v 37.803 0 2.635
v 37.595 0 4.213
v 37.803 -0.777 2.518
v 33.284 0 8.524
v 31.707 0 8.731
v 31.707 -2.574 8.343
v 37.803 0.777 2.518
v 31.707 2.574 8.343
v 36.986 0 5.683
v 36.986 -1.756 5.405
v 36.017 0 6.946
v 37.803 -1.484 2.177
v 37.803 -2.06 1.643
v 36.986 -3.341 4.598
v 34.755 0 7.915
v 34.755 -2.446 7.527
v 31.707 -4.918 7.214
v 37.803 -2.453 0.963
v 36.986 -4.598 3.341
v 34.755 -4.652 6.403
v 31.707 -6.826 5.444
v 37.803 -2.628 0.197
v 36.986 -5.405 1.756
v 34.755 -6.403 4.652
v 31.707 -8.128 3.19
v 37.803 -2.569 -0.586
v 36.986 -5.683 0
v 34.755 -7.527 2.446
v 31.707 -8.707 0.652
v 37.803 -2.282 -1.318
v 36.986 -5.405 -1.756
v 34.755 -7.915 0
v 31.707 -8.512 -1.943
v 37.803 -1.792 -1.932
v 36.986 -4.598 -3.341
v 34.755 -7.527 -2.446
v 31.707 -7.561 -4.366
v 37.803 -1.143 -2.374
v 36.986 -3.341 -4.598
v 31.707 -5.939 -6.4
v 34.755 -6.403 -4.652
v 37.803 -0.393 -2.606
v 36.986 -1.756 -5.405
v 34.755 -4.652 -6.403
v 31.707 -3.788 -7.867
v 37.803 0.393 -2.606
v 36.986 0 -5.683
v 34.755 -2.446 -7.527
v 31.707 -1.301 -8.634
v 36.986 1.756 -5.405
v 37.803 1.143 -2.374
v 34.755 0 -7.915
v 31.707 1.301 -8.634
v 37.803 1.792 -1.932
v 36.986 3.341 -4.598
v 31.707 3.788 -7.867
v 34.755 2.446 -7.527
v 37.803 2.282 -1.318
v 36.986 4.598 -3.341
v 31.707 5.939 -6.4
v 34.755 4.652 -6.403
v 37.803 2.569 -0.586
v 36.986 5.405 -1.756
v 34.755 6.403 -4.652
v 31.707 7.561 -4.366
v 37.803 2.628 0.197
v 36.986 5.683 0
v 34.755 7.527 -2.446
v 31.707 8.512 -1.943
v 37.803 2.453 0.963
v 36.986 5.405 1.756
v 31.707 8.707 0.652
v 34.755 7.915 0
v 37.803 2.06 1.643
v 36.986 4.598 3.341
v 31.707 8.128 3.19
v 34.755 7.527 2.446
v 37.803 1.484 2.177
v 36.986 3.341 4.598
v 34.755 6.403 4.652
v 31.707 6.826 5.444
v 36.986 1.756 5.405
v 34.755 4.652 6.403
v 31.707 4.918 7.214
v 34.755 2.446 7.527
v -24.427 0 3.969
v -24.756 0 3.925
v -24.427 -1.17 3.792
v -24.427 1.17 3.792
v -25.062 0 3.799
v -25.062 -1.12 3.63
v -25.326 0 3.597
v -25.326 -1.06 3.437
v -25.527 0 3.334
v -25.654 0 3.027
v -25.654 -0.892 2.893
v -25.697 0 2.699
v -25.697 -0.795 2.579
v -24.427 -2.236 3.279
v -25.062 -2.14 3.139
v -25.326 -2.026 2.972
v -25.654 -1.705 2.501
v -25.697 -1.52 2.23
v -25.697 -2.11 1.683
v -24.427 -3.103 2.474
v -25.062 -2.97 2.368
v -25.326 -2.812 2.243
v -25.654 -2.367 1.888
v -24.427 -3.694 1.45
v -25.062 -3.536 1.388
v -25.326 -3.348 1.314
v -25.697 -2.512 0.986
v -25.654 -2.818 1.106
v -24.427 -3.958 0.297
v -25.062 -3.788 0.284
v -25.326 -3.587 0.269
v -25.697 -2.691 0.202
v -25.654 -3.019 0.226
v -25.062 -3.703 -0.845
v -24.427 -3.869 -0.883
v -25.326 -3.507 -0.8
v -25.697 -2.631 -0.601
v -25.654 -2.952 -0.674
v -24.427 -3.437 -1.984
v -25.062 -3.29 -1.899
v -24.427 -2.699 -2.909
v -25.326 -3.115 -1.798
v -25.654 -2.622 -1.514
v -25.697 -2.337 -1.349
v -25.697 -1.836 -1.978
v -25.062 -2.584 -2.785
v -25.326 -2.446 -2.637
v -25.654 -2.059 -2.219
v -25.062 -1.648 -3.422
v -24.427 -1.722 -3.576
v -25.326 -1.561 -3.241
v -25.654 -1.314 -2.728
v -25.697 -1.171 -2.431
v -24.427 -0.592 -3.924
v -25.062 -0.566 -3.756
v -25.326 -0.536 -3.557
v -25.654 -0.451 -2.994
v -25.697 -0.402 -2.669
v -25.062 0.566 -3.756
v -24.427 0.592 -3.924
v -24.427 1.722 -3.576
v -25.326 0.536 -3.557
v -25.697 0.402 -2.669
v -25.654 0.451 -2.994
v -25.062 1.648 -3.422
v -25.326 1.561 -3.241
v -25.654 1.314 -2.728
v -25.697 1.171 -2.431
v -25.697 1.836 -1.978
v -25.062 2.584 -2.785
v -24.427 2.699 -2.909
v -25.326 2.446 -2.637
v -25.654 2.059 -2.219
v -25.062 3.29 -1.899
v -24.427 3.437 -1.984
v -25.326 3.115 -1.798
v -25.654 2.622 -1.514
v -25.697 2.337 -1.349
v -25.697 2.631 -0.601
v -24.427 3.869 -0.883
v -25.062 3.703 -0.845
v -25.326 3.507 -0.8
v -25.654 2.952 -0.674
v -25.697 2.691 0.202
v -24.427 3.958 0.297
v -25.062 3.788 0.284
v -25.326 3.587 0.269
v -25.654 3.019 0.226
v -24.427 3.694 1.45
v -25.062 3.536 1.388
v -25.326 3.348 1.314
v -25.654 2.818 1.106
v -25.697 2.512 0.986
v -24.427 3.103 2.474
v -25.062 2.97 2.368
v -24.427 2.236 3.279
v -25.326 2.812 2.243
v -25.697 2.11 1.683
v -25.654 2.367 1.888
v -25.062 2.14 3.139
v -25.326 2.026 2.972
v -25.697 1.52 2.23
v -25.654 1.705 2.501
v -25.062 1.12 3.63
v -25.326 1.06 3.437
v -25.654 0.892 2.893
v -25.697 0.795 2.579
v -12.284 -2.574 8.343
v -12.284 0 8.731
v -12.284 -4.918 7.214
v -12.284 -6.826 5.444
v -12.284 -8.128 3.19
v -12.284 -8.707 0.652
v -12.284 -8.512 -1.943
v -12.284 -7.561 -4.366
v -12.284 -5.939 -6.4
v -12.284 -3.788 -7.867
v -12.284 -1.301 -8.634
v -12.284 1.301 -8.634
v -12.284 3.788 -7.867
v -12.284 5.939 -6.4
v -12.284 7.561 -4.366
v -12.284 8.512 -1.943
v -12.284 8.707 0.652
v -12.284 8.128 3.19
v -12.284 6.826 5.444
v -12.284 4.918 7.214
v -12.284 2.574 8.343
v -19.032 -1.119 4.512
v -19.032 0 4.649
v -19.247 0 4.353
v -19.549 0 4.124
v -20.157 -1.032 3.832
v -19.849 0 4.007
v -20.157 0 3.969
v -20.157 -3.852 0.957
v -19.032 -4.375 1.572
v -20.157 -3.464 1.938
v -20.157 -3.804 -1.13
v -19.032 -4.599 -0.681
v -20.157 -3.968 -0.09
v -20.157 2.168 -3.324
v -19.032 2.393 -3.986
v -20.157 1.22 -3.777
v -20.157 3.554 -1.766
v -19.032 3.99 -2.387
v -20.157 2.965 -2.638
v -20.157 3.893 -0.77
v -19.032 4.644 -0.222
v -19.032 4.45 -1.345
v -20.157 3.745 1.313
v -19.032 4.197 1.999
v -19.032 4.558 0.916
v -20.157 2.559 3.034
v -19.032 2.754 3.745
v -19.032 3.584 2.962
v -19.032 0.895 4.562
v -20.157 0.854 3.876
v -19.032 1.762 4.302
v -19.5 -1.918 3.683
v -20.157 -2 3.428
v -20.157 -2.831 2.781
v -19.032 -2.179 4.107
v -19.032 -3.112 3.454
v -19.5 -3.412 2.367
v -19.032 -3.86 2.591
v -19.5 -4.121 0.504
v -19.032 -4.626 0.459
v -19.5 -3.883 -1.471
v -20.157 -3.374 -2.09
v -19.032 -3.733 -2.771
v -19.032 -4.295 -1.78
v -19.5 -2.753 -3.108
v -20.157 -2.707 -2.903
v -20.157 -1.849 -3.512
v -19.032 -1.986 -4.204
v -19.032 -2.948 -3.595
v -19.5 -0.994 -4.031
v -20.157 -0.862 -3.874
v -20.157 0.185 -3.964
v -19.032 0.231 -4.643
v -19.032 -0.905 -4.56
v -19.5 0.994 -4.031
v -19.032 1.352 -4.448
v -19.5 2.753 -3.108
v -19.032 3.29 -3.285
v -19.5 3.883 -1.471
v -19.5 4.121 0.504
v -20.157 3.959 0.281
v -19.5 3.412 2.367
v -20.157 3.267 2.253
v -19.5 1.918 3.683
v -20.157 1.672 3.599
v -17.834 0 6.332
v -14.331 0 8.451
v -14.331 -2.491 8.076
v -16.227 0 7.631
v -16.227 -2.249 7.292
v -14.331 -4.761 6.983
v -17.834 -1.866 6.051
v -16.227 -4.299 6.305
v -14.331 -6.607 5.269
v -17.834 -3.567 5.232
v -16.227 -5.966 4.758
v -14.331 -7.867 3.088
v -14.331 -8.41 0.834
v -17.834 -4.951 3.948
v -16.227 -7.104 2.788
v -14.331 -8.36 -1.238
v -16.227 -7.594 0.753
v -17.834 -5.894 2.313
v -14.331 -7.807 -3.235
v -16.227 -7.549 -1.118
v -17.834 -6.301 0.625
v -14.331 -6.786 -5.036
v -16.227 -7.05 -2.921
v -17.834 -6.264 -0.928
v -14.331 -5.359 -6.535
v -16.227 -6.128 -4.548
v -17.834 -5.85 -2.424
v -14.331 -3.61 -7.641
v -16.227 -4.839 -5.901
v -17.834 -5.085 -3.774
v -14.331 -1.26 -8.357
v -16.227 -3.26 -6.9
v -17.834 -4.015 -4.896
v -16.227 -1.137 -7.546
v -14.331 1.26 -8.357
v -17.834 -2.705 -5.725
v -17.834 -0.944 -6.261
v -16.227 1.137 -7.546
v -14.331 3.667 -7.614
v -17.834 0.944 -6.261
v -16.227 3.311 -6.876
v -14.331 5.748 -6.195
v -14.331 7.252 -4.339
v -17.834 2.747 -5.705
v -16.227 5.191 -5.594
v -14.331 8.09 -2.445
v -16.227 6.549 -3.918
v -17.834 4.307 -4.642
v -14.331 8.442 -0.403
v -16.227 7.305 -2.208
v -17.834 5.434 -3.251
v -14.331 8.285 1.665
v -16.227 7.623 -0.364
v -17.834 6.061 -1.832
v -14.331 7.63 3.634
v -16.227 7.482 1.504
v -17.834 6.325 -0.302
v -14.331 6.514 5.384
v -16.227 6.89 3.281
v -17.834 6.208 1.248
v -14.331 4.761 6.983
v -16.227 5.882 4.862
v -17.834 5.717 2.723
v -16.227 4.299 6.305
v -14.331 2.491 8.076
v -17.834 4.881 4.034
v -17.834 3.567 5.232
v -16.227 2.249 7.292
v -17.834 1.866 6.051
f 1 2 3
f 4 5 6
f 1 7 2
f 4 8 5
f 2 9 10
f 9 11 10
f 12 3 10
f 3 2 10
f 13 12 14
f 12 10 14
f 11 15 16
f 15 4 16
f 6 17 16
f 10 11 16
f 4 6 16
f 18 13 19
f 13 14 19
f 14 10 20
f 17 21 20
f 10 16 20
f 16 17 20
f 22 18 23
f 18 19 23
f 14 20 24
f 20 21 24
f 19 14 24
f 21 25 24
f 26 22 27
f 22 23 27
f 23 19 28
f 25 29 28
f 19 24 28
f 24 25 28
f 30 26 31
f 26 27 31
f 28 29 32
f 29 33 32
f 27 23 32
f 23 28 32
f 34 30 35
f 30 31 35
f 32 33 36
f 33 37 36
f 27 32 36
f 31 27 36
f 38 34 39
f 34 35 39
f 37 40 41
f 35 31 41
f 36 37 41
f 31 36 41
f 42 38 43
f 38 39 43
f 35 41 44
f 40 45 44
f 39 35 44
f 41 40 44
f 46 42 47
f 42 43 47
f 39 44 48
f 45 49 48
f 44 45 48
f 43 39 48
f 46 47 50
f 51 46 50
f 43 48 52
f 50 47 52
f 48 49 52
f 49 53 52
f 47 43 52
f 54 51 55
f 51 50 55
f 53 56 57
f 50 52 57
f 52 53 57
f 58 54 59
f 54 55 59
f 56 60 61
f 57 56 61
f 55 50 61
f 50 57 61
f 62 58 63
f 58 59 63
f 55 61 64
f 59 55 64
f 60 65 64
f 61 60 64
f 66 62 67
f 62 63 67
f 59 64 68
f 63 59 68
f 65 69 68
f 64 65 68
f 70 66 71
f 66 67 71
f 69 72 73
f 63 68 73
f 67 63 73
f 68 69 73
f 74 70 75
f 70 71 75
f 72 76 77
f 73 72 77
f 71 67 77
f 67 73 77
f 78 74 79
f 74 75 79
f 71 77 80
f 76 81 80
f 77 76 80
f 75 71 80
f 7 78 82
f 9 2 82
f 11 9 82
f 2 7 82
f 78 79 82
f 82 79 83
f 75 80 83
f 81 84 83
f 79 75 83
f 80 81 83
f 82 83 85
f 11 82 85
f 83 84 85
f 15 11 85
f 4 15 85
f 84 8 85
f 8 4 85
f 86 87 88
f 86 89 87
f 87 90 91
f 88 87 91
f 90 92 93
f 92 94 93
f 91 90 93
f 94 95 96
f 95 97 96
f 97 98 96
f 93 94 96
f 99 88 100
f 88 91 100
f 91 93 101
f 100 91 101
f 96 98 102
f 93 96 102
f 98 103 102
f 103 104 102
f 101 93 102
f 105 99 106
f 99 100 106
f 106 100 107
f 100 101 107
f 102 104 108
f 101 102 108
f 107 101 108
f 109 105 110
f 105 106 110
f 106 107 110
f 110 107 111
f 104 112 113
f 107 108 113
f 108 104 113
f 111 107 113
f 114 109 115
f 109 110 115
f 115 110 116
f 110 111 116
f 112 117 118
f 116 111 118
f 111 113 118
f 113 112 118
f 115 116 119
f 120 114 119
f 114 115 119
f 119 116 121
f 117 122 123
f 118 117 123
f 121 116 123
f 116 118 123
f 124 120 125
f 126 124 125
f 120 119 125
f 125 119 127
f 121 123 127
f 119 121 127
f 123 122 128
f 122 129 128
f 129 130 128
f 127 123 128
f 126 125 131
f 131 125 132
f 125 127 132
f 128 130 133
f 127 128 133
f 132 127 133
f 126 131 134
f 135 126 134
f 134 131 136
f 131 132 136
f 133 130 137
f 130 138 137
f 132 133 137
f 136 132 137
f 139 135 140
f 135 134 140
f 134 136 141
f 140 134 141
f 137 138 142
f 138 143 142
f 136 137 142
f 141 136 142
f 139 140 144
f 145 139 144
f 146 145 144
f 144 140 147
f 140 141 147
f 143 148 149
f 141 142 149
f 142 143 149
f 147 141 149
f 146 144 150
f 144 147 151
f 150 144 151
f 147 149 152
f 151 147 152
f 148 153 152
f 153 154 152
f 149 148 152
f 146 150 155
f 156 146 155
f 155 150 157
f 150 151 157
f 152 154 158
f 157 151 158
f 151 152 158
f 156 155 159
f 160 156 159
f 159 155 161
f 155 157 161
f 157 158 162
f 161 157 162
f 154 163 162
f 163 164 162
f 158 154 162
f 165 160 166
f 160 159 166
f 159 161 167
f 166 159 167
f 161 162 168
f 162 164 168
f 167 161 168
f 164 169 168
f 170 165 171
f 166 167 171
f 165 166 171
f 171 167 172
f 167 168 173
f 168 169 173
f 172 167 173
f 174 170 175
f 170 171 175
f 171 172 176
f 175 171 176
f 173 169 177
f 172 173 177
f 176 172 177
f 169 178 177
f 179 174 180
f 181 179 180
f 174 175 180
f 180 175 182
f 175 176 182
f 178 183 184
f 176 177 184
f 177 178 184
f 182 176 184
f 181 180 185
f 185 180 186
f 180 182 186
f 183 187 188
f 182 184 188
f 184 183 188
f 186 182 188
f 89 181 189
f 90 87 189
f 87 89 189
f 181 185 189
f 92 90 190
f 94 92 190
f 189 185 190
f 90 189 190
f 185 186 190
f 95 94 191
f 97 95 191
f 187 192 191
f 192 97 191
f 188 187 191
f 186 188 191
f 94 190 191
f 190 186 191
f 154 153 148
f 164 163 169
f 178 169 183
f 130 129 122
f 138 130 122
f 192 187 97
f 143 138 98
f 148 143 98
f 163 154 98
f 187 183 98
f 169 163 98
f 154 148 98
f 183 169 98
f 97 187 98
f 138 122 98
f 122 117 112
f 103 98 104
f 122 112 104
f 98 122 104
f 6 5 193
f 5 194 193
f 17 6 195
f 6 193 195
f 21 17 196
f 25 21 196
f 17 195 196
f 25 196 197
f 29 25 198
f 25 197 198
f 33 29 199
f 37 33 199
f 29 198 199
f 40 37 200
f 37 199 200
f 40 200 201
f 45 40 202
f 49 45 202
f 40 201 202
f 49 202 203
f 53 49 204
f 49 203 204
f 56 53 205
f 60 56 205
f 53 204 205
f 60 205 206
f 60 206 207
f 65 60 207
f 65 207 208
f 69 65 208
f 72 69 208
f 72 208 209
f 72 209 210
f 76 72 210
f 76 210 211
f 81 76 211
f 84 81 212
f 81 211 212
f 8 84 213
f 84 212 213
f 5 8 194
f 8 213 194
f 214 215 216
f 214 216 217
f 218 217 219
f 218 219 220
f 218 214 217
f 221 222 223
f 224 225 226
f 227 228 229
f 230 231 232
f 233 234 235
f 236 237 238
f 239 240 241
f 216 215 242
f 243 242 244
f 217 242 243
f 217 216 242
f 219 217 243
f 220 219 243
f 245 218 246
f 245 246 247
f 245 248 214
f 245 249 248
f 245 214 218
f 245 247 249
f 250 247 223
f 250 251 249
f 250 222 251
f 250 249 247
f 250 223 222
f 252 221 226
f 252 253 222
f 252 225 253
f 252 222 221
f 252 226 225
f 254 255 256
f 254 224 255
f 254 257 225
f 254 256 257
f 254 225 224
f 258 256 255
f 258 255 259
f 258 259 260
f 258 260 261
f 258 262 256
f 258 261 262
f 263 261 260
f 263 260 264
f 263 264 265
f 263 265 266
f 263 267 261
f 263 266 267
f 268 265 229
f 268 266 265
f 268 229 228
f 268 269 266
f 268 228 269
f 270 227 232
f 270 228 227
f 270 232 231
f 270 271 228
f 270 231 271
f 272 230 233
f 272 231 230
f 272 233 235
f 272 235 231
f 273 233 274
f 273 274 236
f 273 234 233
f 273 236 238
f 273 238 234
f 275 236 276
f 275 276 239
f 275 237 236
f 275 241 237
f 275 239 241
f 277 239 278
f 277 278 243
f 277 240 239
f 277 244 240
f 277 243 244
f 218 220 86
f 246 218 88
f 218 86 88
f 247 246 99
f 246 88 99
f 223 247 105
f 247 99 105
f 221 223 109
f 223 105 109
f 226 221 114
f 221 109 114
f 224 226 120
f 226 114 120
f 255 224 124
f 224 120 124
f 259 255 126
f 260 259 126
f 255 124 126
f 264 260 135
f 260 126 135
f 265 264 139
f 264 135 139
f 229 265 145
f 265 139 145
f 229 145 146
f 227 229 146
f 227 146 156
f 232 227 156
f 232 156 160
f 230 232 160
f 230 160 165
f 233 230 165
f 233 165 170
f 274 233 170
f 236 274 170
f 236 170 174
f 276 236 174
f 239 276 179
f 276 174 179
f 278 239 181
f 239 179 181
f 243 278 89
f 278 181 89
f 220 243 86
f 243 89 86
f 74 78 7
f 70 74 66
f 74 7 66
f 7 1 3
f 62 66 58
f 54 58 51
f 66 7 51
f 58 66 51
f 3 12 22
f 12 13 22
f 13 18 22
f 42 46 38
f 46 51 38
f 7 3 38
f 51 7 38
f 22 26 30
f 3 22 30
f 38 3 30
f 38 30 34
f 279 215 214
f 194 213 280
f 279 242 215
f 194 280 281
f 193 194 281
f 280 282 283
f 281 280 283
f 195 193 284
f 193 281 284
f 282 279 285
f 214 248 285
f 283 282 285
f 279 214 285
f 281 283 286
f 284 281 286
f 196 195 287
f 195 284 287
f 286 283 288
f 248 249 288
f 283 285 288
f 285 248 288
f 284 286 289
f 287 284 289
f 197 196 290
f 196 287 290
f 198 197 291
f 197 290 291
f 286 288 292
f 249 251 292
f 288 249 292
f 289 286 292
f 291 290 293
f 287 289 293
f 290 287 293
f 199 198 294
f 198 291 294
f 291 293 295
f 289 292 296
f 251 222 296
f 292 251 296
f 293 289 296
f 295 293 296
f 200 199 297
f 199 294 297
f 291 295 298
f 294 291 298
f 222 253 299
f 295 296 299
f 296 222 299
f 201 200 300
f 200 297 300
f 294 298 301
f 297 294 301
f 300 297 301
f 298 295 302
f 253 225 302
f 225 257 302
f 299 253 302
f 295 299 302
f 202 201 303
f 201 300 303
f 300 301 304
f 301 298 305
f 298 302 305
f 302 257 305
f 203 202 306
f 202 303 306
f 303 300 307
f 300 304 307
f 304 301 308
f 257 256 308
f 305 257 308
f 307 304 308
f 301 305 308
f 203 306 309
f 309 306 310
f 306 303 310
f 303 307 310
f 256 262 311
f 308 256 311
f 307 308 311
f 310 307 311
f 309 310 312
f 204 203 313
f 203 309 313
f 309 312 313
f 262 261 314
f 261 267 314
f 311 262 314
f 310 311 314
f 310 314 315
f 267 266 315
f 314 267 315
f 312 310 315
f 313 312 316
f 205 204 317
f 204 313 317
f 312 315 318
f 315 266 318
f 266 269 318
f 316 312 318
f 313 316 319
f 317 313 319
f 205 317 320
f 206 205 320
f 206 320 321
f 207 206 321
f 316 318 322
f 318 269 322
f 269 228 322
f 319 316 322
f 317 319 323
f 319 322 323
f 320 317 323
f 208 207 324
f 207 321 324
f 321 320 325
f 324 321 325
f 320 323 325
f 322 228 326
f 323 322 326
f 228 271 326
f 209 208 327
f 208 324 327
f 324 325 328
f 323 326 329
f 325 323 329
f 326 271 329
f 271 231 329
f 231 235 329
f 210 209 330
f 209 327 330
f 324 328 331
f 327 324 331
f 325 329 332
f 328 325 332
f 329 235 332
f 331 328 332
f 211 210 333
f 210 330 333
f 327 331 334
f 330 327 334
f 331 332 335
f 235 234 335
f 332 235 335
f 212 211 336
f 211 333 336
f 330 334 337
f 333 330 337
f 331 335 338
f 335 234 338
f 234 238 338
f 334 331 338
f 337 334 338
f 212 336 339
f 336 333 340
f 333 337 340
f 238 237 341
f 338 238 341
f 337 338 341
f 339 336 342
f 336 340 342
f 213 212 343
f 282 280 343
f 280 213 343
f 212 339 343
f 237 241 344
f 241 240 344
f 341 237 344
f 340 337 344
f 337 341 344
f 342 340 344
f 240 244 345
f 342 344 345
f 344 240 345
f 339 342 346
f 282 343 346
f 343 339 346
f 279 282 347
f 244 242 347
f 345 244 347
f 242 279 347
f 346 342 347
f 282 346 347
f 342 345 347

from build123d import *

# Parameters (mm, degrees)
F2_R = 6.096
F4_R = 1.27


# Not quite as in the source:
# - a fillet or chamfer that OpenCascade refuses, or shapes differently, is made with other operations: its cross-section is extruded or revolved along the edge and cut away or added


with BuildPart() as f1:
    # F0 (on Front) → F1 (revolve)
    with BuildSketch(Plane.XZ):
        Polygon((-25.6974867058, 3.96875), (-25.6974867058, 0), (37.8025132942, 0), (37.8025132942, 8.73125), (-19.3474867058, 8.73125), (-19.3474867058, 3.96875), align=None)
    revolve(axis=Axis((6.0525132942, 0, 0), (1, 0, 0)))

    # F2
    f2_edges = [f1.edges().sort_by_distance(p)[0] for p in [
        (37.802513, 0, -8.73125),
    ]]
    fillet(f2_edges, radius=F2_R)

    # F3: fillet of radius 7.62 on 1 edges, made by hand

    # F3_s1 → F3_t2 (revolve, cut)
    with BuildSketch(Plane.XZ):
        with BuildLine():
            ThreePointArc((-12.2835576468, 8.73125), (-16.543267144, 7.4294202256), (-19.3474867058, 3.96875))
            Line((-19.3474867058, 3.96875), (-19.3474867058, 8.73125))
            Line((-19.3474867058, 8.73125), (-12.2835576468, 8.73125))
        make_face()
    revolve(axis=Axis((-19.3474867058, 0, 0), (1, 0, 0)), mode=Mode.SUBTRACT)

    # F4
    f4_edges = [f1.edges().sort_by_distance(p)[0] for p in [
        (-22.522487, 0, 3.96875),
        (-25.697487, 0, -3.96875),
        (-19.347487, 0, -3.96875),
    ]]
    fillet(f4_edges, radius=F4_R)


solid = f1.part
